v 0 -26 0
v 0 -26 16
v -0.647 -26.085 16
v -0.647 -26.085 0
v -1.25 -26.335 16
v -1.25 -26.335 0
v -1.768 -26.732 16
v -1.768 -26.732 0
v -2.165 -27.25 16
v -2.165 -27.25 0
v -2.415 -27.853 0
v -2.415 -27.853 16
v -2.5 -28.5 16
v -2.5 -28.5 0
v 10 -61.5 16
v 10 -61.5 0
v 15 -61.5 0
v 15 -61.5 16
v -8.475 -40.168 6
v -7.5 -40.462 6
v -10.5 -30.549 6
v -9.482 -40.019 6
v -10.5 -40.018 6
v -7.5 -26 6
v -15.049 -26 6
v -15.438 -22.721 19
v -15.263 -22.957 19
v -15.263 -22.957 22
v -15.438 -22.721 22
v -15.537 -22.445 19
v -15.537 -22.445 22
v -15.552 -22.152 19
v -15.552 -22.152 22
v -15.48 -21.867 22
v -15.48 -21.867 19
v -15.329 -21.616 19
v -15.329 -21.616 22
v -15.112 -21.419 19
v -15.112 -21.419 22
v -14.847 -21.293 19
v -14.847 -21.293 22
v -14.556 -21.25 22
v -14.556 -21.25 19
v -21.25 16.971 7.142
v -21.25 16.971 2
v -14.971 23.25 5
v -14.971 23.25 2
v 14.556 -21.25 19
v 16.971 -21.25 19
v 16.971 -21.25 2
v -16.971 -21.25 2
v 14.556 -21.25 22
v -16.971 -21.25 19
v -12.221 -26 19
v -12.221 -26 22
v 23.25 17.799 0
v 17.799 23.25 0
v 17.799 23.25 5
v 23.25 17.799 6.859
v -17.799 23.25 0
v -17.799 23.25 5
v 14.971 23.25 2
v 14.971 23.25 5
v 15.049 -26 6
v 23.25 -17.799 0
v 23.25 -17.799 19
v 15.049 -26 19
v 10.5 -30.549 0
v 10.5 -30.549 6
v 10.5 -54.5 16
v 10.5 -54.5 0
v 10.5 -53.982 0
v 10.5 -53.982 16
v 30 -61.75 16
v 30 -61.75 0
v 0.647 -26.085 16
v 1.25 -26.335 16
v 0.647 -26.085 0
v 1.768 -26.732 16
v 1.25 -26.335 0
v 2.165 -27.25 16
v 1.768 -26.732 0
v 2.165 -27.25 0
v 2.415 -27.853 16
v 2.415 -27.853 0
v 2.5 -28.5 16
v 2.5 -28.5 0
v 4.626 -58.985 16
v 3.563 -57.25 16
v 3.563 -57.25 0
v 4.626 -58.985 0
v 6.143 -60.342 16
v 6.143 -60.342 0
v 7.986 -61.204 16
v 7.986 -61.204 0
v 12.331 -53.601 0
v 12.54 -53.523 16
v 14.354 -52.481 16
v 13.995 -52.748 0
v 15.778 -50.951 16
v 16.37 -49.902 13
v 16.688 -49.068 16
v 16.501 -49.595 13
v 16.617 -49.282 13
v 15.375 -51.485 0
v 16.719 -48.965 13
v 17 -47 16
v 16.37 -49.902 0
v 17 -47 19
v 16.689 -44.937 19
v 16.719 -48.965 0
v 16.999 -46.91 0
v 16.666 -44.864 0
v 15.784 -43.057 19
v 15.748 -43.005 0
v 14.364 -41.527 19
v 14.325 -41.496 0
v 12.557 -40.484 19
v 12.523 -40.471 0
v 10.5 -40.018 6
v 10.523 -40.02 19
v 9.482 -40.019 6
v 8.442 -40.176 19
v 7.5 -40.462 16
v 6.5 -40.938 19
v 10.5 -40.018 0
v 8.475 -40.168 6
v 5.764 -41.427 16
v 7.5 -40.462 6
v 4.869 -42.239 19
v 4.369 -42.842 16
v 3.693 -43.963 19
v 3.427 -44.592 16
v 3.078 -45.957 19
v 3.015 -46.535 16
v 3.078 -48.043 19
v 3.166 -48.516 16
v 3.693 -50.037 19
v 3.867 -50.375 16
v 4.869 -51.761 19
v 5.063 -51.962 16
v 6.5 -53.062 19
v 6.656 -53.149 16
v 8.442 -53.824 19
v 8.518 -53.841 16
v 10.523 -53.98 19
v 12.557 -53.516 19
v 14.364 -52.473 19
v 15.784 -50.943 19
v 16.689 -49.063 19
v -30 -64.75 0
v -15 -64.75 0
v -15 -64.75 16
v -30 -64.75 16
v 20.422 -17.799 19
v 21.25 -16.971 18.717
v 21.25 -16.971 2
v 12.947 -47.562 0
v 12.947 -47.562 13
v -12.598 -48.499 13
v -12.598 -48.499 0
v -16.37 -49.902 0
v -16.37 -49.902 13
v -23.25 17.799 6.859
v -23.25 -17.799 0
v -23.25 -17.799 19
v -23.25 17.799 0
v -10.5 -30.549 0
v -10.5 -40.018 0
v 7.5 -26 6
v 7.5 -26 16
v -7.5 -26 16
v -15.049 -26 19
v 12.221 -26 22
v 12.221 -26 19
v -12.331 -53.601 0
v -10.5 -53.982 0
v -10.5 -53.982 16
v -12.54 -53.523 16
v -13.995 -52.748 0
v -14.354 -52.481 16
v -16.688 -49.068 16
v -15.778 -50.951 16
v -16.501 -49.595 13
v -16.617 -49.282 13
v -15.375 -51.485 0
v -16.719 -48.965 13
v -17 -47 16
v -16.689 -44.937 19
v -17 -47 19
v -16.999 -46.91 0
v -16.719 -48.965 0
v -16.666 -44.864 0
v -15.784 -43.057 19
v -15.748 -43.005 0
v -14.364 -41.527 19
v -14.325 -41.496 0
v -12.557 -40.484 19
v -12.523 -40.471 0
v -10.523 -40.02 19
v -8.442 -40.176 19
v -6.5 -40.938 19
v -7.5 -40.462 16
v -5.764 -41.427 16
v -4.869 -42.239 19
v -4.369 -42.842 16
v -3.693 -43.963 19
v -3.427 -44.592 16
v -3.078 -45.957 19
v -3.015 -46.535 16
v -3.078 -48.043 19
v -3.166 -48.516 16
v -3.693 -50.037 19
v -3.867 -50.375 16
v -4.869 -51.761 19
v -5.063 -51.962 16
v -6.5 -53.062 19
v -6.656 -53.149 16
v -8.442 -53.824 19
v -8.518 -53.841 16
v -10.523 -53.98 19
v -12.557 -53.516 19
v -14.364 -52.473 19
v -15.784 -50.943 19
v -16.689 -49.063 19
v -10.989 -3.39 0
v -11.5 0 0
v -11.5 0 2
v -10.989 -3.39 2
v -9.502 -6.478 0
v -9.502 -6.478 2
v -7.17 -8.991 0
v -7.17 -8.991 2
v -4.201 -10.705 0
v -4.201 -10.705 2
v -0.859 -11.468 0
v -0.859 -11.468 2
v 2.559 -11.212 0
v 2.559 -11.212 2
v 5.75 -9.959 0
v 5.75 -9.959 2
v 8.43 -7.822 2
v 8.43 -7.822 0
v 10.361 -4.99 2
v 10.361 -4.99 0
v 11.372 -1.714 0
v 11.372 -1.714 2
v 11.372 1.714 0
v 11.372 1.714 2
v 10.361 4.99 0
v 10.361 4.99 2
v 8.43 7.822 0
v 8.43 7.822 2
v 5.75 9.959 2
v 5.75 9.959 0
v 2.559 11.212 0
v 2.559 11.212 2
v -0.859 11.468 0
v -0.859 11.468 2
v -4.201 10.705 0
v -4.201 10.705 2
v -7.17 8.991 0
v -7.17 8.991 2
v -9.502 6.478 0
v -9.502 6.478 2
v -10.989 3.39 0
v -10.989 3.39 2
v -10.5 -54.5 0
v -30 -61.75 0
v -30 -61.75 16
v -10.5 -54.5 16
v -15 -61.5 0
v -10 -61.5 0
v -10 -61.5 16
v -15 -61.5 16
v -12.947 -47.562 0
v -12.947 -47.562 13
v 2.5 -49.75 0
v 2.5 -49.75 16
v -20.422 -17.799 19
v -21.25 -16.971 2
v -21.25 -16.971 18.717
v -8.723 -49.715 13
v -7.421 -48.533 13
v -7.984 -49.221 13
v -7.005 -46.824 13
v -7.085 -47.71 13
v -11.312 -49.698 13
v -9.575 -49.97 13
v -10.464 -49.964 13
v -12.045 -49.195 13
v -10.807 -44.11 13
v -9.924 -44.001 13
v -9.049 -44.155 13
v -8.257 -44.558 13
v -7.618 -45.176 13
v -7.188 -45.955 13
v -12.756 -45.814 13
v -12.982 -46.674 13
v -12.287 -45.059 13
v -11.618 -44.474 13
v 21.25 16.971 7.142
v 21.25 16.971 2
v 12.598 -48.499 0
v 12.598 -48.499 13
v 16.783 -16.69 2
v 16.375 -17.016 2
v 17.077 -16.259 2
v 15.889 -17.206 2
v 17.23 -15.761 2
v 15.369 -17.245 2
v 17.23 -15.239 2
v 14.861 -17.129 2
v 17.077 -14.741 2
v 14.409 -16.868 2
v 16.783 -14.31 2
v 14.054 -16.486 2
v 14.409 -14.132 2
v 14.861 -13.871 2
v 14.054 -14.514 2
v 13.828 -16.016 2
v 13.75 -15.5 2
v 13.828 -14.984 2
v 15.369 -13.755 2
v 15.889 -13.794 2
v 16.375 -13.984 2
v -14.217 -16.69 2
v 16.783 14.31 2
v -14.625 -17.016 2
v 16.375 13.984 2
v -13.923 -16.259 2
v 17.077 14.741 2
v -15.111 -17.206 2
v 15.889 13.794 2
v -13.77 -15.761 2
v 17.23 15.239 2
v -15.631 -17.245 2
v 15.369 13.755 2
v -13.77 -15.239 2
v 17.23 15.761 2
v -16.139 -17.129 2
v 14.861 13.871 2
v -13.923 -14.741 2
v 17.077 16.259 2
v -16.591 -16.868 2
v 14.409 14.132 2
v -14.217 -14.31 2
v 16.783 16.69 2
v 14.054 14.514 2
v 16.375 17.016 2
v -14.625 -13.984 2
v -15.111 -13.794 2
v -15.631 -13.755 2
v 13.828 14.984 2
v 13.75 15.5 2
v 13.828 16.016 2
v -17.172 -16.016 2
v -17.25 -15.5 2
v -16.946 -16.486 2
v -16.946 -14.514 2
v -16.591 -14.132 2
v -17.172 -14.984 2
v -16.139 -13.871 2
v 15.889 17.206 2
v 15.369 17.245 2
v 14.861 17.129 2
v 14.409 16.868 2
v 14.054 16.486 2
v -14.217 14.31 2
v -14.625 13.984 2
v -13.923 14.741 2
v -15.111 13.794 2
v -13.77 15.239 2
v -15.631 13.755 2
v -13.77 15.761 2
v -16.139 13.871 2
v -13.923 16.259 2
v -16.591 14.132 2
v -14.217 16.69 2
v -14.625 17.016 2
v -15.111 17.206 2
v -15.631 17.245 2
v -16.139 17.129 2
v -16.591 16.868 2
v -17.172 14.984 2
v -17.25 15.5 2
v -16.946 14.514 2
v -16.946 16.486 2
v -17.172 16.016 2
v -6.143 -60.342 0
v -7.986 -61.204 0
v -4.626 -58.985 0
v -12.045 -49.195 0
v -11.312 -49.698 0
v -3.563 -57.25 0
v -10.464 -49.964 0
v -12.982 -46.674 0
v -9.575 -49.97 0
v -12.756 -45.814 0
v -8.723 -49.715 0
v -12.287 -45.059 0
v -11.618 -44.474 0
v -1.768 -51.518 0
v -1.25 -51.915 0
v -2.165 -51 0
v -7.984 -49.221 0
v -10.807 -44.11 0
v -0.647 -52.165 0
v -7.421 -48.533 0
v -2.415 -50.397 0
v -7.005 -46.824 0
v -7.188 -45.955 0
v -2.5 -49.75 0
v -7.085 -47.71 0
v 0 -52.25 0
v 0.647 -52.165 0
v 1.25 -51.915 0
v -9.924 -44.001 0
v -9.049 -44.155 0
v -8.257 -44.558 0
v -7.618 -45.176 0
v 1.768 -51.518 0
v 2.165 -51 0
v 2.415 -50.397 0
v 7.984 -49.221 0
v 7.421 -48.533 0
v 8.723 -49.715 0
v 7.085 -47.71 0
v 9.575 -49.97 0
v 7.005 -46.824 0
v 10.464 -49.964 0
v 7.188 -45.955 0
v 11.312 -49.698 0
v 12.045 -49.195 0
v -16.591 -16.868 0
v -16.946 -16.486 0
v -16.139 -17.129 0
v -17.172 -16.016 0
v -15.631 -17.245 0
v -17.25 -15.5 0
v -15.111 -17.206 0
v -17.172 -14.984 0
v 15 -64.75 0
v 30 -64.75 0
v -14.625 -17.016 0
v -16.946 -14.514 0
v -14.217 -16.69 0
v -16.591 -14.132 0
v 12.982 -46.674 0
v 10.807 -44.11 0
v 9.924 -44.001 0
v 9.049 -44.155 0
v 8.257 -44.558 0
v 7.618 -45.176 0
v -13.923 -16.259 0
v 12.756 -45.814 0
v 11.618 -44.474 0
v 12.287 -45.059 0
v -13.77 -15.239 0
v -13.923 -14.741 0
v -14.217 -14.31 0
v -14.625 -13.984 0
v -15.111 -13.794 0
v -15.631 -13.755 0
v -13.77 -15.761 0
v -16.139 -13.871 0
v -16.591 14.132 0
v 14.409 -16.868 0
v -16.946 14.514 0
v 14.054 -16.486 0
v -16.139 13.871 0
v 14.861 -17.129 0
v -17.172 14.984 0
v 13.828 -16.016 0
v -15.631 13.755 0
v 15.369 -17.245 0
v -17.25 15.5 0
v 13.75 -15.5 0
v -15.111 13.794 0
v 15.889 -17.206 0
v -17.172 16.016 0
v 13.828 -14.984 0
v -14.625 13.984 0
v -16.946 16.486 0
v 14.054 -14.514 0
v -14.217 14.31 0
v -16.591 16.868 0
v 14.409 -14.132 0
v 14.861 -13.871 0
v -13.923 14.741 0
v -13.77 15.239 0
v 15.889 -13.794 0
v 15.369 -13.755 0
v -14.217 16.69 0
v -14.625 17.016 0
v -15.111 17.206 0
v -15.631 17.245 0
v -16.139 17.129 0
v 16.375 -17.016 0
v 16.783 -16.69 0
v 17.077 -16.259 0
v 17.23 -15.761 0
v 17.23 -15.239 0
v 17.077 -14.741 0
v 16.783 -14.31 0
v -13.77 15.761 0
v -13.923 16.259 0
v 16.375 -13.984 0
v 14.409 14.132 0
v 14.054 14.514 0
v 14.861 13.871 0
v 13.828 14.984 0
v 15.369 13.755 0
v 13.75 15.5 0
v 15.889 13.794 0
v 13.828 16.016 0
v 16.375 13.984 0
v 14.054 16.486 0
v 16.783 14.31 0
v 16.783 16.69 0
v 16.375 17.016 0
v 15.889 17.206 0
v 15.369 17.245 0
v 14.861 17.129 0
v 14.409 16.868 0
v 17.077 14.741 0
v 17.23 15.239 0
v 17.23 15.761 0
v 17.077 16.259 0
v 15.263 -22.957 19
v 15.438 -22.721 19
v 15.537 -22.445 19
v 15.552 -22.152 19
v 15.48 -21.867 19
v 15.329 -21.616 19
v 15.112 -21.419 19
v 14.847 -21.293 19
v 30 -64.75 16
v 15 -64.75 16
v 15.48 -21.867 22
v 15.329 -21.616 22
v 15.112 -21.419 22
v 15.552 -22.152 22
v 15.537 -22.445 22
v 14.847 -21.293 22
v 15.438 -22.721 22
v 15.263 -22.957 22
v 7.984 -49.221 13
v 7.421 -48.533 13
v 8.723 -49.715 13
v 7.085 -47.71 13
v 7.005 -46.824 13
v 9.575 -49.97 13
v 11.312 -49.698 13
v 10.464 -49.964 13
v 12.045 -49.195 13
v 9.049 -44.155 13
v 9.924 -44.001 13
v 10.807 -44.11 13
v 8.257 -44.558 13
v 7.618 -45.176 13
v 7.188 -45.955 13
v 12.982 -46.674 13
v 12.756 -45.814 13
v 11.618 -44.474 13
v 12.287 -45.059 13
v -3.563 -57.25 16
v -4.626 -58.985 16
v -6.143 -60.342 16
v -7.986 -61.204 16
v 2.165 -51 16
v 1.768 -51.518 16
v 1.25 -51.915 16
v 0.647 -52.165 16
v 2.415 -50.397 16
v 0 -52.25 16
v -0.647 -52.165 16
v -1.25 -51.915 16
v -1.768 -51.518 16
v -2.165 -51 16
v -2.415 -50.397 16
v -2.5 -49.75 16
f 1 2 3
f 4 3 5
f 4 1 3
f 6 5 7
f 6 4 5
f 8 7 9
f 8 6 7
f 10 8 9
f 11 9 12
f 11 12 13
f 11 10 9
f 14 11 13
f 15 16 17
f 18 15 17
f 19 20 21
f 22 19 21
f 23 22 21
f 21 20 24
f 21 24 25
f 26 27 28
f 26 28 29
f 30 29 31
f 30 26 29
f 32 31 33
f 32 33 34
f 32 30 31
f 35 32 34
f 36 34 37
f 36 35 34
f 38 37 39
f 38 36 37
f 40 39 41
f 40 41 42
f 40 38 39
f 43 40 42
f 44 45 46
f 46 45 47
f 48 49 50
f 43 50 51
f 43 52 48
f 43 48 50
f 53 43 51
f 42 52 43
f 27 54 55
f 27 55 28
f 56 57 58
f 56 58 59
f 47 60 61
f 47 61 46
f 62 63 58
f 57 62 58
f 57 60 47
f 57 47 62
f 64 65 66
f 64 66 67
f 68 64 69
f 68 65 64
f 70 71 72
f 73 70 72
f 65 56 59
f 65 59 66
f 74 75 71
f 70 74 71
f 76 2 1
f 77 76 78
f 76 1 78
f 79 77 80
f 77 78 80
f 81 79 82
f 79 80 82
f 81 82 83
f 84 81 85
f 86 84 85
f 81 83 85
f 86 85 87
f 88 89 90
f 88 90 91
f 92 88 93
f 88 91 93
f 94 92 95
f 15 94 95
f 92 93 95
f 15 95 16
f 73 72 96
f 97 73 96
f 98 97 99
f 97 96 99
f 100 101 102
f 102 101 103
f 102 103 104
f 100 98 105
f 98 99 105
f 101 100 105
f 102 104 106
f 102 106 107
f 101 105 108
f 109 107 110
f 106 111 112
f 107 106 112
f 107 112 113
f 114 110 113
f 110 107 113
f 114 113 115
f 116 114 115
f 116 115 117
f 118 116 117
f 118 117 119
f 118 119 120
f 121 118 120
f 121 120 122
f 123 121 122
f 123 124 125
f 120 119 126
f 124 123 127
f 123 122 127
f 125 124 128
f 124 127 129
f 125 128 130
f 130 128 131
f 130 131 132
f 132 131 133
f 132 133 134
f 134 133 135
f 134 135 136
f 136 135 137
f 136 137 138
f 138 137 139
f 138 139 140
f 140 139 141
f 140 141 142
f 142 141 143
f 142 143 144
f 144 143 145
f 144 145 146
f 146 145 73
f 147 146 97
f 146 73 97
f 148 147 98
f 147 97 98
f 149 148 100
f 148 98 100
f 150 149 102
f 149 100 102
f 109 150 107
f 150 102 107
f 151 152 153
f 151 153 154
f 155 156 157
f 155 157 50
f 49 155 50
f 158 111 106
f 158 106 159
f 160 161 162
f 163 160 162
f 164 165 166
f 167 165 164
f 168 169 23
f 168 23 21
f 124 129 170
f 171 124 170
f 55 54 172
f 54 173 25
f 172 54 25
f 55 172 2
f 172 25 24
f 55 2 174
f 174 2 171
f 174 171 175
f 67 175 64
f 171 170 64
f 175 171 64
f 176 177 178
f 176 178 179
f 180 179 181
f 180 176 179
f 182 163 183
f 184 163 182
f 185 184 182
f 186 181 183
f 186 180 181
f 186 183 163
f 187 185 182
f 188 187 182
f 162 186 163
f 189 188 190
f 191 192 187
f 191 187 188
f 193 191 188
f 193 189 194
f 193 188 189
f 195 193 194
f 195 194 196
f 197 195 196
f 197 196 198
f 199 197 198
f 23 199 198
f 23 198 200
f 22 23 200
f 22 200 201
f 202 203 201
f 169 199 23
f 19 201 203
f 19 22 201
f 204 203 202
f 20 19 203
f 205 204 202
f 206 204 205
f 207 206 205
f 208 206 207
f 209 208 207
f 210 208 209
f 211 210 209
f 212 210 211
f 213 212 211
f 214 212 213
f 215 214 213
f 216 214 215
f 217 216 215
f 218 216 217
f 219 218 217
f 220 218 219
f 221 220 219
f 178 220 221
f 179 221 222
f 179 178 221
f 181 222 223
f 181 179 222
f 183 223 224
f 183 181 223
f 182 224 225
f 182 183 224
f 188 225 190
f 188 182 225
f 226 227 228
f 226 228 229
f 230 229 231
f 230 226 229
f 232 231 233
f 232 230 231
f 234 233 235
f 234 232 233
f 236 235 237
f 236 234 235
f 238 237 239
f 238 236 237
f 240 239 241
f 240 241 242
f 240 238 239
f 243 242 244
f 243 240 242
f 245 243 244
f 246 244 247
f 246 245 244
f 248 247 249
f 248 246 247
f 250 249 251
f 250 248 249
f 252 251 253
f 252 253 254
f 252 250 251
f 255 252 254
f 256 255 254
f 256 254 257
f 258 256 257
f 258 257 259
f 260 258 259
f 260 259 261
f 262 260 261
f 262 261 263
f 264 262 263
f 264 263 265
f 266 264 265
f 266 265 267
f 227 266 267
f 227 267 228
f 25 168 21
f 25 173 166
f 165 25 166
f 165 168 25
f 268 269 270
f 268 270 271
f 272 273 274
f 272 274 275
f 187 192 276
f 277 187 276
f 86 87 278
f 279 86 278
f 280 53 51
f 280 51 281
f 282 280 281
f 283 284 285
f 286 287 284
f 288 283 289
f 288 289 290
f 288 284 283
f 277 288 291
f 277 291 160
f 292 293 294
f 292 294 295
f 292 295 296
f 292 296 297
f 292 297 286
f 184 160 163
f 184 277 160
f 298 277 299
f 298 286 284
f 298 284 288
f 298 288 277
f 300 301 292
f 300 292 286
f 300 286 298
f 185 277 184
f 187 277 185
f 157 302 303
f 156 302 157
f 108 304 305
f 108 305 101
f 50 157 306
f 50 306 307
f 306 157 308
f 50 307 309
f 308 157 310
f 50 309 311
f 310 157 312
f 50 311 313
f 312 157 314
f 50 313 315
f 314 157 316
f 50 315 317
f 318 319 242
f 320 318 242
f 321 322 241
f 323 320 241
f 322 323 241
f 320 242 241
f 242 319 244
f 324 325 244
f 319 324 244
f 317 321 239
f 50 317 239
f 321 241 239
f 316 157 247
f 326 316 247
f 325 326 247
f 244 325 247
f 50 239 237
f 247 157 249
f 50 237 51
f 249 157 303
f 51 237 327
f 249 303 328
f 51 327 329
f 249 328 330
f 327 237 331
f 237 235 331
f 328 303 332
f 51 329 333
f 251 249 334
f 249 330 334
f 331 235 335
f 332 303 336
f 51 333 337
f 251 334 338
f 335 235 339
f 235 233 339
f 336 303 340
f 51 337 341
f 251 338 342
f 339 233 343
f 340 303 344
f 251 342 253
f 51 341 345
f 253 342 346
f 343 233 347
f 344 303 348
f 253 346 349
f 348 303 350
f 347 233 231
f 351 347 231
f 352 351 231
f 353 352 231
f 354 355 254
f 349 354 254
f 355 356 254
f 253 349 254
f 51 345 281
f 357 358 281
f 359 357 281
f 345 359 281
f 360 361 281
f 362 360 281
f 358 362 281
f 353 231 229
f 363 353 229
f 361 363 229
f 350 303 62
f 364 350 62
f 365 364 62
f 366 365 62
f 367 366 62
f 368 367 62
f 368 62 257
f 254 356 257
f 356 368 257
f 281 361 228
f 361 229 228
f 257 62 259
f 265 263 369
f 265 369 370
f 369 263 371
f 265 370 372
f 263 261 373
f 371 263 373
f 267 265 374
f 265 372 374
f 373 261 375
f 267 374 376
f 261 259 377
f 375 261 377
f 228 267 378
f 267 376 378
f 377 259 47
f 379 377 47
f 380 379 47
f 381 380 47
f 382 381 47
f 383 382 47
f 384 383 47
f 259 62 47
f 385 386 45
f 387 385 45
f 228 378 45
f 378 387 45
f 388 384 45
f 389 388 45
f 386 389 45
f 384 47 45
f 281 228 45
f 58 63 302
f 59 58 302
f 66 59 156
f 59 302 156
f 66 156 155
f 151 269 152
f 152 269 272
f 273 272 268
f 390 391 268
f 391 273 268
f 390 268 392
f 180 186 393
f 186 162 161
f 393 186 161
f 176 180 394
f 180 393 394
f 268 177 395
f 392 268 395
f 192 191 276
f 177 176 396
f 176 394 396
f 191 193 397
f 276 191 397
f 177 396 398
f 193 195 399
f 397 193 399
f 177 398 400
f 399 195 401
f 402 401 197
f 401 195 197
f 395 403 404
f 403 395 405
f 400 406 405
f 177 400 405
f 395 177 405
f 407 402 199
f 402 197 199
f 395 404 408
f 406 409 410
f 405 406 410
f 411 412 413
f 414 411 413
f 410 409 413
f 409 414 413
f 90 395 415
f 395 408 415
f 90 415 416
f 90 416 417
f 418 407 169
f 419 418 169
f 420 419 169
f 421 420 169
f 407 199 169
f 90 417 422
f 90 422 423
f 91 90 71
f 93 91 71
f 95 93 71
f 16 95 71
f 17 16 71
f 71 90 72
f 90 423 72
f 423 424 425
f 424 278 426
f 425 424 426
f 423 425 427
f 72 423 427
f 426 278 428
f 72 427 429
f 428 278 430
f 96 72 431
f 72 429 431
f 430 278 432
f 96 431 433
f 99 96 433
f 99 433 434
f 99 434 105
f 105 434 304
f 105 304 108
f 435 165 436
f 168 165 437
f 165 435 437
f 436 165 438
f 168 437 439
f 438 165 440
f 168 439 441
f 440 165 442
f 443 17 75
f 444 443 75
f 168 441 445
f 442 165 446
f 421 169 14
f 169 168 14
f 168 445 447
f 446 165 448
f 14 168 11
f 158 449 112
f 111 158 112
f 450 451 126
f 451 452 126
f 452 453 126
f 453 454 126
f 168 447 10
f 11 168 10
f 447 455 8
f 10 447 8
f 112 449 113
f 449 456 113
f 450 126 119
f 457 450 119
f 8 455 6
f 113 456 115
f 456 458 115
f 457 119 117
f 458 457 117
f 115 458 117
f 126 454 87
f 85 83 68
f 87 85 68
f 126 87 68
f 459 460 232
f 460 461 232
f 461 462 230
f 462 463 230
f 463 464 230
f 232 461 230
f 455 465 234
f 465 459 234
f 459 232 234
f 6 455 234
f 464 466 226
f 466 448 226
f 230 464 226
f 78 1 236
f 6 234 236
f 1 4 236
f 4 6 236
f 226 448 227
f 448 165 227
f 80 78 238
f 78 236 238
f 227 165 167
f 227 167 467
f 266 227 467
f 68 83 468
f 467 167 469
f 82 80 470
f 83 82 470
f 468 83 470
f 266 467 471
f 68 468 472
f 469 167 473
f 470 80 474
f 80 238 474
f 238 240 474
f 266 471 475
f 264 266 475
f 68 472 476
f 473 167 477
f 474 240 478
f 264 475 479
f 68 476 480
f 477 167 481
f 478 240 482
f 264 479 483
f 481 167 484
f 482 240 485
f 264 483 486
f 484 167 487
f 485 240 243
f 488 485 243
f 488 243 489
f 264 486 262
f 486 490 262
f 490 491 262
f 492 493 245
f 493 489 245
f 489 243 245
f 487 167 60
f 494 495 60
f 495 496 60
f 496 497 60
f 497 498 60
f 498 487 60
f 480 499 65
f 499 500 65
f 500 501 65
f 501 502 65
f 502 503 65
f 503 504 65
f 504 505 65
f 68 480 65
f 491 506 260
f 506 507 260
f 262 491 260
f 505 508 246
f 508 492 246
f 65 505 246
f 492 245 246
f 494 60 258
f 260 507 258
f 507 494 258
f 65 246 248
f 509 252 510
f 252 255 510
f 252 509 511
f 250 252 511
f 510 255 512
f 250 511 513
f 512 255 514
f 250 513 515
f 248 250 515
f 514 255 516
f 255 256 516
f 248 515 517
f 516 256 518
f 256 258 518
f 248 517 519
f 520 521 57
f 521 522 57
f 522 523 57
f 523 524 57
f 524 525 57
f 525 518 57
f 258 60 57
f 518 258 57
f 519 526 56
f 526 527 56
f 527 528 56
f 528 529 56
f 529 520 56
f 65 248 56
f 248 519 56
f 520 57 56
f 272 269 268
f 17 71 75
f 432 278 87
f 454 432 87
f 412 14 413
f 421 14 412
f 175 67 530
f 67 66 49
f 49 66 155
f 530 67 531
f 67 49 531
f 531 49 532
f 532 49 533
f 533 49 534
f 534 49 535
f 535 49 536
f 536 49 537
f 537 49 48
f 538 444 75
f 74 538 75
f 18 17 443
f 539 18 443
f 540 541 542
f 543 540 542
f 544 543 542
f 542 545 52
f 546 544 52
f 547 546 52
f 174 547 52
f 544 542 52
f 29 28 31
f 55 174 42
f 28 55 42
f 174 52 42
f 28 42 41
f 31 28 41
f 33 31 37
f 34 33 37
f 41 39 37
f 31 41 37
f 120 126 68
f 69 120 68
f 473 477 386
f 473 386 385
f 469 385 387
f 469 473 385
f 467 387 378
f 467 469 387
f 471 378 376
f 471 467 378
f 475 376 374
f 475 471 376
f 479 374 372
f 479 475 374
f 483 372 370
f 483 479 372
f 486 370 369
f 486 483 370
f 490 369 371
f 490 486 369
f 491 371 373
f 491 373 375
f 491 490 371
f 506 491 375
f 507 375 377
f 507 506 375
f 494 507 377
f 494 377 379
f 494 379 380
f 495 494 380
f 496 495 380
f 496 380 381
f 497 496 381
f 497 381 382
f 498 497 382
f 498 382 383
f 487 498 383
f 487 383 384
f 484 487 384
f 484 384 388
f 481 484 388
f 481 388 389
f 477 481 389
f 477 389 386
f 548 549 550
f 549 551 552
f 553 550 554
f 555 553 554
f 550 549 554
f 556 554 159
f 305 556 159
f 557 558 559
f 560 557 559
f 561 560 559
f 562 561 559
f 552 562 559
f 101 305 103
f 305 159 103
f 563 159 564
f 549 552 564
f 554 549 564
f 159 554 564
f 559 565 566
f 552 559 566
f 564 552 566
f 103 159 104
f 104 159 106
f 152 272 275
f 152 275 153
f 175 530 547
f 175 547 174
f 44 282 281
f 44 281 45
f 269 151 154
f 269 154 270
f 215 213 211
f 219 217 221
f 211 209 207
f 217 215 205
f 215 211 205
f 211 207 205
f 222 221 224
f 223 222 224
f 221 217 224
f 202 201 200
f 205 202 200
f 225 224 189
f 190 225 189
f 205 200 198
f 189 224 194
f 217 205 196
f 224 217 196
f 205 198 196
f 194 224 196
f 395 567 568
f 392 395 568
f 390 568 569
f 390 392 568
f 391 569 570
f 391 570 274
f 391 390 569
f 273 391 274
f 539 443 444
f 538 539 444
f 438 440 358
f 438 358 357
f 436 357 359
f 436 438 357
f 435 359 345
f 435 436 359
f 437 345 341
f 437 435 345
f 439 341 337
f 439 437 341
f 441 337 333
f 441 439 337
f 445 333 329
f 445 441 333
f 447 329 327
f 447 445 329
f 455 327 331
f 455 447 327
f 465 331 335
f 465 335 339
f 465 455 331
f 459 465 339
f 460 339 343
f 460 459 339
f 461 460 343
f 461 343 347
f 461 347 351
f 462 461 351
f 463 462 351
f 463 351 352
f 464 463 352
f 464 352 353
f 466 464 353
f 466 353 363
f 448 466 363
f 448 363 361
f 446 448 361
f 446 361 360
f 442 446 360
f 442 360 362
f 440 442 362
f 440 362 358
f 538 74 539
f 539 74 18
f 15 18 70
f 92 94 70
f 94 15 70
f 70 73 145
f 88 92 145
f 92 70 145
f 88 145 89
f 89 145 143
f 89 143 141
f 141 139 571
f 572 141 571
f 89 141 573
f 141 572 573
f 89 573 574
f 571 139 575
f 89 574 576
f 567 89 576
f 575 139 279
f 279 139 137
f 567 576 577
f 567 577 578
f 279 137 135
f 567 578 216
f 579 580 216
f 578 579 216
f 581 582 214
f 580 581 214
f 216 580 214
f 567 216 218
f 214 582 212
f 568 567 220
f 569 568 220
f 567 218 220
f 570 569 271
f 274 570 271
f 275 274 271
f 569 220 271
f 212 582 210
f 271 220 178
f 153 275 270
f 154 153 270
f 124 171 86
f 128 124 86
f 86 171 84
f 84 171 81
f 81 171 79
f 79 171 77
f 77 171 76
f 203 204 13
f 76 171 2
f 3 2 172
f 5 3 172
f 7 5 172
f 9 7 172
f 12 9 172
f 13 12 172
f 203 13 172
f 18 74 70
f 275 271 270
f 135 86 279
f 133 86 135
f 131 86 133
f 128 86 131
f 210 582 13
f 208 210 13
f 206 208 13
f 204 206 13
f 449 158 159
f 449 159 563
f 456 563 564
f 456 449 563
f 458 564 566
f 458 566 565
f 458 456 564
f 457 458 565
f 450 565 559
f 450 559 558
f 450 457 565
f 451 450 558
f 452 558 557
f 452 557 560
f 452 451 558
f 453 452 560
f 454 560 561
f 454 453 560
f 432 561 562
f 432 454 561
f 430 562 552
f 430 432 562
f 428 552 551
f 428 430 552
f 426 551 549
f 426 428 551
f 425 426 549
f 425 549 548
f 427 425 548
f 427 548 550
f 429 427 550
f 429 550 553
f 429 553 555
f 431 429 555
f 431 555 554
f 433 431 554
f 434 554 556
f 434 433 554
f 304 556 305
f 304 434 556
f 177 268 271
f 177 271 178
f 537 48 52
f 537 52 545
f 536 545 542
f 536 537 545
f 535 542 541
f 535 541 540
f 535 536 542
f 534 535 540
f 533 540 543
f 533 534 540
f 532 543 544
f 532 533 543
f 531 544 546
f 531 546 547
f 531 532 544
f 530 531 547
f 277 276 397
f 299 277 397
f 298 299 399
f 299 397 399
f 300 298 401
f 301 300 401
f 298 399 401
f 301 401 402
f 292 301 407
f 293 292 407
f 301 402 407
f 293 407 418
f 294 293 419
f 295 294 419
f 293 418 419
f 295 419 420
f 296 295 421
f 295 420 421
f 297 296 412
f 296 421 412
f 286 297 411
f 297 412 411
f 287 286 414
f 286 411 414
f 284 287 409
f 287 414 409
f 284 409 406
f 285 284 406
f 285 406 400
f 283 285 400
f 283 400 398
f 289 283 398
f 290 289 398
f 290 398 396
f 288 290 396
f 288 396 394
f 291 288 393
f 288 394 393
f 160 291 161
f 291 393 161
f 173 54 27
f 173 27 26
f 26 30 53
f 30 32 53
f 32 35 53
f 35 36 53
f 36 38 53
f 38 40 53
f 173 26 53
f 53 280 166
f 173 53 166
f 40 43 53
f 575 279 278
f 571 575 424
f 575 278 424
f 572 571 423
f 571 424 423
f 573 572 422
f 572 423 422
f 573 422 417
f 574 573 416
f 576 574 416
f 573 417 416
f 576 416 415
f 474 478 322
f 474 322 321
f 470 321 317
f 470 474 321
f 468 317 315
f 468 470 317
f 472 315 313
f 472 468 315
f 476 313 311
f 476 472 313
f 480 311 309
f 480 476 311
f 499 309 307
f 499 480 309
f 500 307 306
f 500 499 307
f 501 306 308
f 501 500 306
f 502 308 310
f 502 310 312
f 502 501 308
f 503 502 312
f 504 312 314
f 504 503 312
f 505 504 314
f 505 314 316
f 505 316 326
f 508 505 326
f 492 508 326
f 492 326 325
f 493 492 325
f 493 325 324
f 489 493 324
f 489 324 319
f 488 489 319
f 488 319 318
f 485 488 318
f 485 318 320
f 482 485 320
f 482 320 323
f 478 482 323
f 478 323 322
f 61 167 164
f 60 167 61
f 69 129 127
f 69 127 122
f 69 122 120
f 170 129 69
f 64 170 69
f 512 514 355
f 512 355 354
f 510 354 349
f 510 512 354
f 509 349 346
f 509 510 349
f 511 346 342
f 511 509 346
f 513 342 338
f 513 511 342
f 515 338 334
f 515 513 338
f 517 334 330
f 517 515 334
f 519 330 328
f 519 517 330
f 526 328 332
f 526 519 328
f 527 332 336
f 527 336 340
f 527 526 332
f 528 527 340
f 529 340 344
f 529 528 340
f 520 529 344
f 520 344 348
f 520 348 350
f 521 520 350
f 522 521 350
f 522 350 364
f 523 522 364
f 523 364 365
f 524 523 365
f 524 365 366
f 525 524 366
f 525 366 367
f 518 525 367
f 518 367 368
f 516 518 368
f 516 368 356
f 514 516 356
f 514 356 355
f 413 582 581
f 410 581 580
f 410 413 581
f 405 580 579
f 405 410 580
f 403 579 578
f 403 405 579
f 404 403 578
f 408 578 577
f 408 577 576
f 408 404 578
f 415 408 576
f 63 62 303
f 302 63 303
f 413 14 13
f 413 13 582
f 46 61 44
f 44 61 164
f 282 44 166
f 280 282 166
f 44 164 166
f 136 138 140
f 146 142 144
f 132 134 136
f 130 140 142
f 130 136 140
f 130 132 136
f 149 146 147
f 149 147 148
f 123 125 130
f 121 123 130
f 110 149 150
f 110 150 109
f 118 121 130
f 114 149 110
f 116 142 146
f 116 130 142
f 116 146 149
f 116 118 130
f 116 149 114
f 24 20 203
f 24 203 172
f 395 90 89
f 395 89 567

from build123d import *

# Parameters (mm, degrees)
SKETCH3_R               = 11.5
SKETCH3_R_2             = 1.75
BOSS_EXTRUDE1_DEPTH     = 19
CUT_EXTRUDE1_START      = 19
SKETCH3_3_R             = 11.5
SKETCH3_3_R_2           = 1.75
CUT_EXTRUDE1_DEPTH      = 17
SKETCH3_4_R             = 1.75
SKETCH3_4_R_2           = 11.5
CUT_EXTRUDE3_DEPTH      = 38.975320933
CUT_EXTRUDE7_DEPTH      = 38.975320933
CUT_EXTRUDE7_DEPTH_BACK = 38.975320933
CUT_EXTRUDE8_DEPTH      = 38.015199581
BOSS_EXTRUDE4_DEPTH     = 19
BOSS_EXTRUDE5_START     = 19
BOSS_EXTRUDE5_DEPTH     = 3
BOSS_EXTRUDE6_DEPTH     = 6
BOSS_EXTRUDE7_START     = -6
BOSS_EXTRUDE7_DEPTH     = 16
SKETCH14_R              = 7
BOSS_EXTRUDE8_DEPTH     = 3
CUT_EXTRUDE10_DEPTH     = 13


# Read off the part's stored shape, not the designer's step: Boss-Extrude7, Cut-Extrude10
with BuildPart() as part:
    # Sketch3 → Boss-Extrude1 (new body)
    # profile 1 of 7: a face of its own
    with BuildSketch(Plane.XY):
        Polygon((-23.25, 17.798989873), (-17.798989873, 23.25), (17.798989873, 23.25), (23.25, 17.798989873), (23.25, -17.798989873), (17.798989873, -23.25), (-17.798989873, -23.25), (-23.25, -17.798989873), align=None)
        Polygon((21.25, 16.970562748), (16.970562748, 21.25), (-16.970562748, 21.25), (-21.25, 16.970562748), (-21.25, -16.970562748), (-16.970562748, -21.25), (16.970562748, -21.25), (21.25, -16.970562748), align=None, mode=Mode.SUBTRACT)
    # profile 2 of 7: a face of its own
    with BuildSketch(Plane.XY):
        Polygon((21.25, 16.970562748), (21.25, -16.970562748), (16.970562748, -21.25), (-16.970562748, -21.25), (-21.25, -16.970562748), (-21.25, 16.970562748), (-16.970562748, 21.25), (16.970562748, 21.25), align=None)
        Circle(SKETCH3_R, mode=Mode.SUBTRACT)
        with Locations((-15.5, -15.5)):
            Circle(SKETCH3_R_2, mode=Mode.SUBTRACT)
        with Locations((15.5, -15.5)):
            Circle(SKETCH3_R_2, mode=Mode.SUBTRACT)
        with Locations((15.5, 15.5)):
            Circle(SKETCH3_R_2, mode=Mode.SUBTRACT)
        with Locations((-15.5, 15.5)):
            Circle(SKETCH3_R_2, mode=Mode.SUBTRACT)
    # profile 3 of 7: a face of its own
    with BuildSketch(Plane.XY):
        with Locations((-15.5, 15.5)):
            Circle(SKETCH3_R_2)
    # profile 4 of 7: a face of its own
    with BuildSketch(Plane.XY):
        with Locations((15.5, 15.5)):
            Circle(SKETCH3_R_2)
    # profile 5 of 7: a face of its own
    with BuildSketch(Plane.XY):
        with Locations((15.5, -15.5)):
            Circle(SKETCH3_R_2)
    # profile 6 of 7: a face of its own
    with BuildSketch(Plane.XY):
        with Locations((-15.5, -15.5)):
            Circle(SKETCH3_R_2)
    # profile 7 of 7: a face of its own
    with BuildSketch(Plane.XY):
        Circle(SKETCH3_R)
    extrude(amount=BOSS_EXTRUDE1_DEPTH)

    # Sketch3<3> → Cut-Extrude1 (cut)
    with BuildSketch(Plane.XY.offset(CUT_EXTRUDE1_START)):
        Polygon((21.25, 16.970562748), (21.25, -16.970562748), (16.970562748, -21.25), (-16.970562748, -21.25), (-21.25, -16.970562748), (-21.25, 16.970562748), (-16.970562748, 21.25), (16.970562748, 21.25), align=None)
        Circle(SKETCH3_3_R, mode=Mode.SUBTRACT)
        with Locations((-15.5, -15.5)):
            Circle(SKETCH3_3_R_2, mode=Mode.SUBTRACT)
        with Locations((15.5, -15.5)):
            Circle(SKETCH3_3_R_2, mode=Mode.SUBTRACT)
        with Locations((15.5, 15.5)):
            Circle(SKETCH3_3_R_2, mode=Mode.SUBTRACT)
        with Locations((-15.5, 15.5)):
            Circle(SKETCH3_3_R_2, mode=Mode.SUBTRACT)
    extrude(amount=-CUT_EXTRUDE1_DEPTH, mode=Mode.SUBTRACT)

    # Sketch3<4> → Cut-Extrude3 (cut, through all)
    with BuildSketch(Plane.XY):
        with Locations(Location((-15.5, 15.5, 0), (0, 0, 180))):
            Circle(SKETCH3_4_R)
        with Locations(Location((15.5, 15.5, 0), (0, 0, 180))):
            Circle(SKETCH3_4_R)
        with Locations(Location((-15.5, -15.5, 0), (0, 0, 180))):
            Circle(SKETCH3_4_R)
        with Locations(Location((0, 0, 0), (0, 0, 180))):
            Circle(SKETCH3_4_R_2)
        with Locations(Location((15.5, -15.5, 0), (0, 0, 180))):
            Circle(SKETCH3_4_R)
    extrude(amount=CUT_EXTRUDE3_DEPTH, mode=Mode.SUBTRACT)

    # Sketch6 → Cut-Extrude7 (cut, two sides: drawn at the far end of the back side and taken through both)
    with BuildSketch(Plane(origin=(0, 0, 0), x_dir=(0, 0, -1), z_dir=(1, 0, 0)).offset(-CUT_EXTRUDE7_DEPTH_BACK)):
        Polygon((-19, 23.25), (-5, 23.25), (-19, -17.798989873), align=None)
    extrude(amount=CUT_EXTRUDE7_DEPTH + CUT_EXTRUDE7_DEPTH_BACK, mode=Mode.SUBTRACT)

    # Sketch8 → Cut-Extrude8 (cut, through all)
    with BuildSketch(Plane.XY.offset(2)):
        Polygon((-16.970562748, 21.25), (-14.970562748, 23.25), (14.970562748, 23.25), (16.970562748, 21.25), align=None)
    extrude(amount=CUT_EXTRUDE8_DEPTH, mode=Mode.SUBTRACT)

    # Sketch10 → Boss-Extrude4 (add)
    with BuildSketch(Plane.XY):
        Polygon((19.798989873, -21.25), (-19.798989873, -21.25), (-15.048989873, -26), (15.048989873, -26), align=None)
    extrude(amount=BOSS_EXTRUDE4_DEPTH)

    # Sketch11 → Boss-Extrude5 (add)
    with BuildSketch(Plane.XY.offset(BOSS_EXTRUDE5_START)):
        with BuildLine():
            Line((-14.556349186, -21.25), (14.556349186, -21.25))
            ThreePointArc((14.556349186, -21.25), (15.480228719, -21.867316568), (15.263455967, -22.957106781))
            Line((15.263455967, -22.957106781), (12.220562748, -26))
            Line((12.220562748, -26), (-12.220562748, -26))
            Line((-12.220562748, -26), (-15.263455967, -22.957106781))
            ThreePointArc((-15.263455967, -22.957106781), (-15.480228719, -21.867316568), (-14.556349186, -21.25))
        make_face()
    extrude(amount=BOSS_EXTRUDE5_DEPTH)


with BuildPart() as body_2:
    # Sketch12 → Boss-Extrude6 (new body)
    with BuildSketch(Plane.XY):
        with BuildLine():
            Line((2.5, -28.5), (2.5, -49.75))
            ThreePointArc((2.5, -49.75), (1.767766953, -51.517766953), (0, -52.25))
            Line((0, -52.25), (0, -57.25))
            Line((0, -57.25), (10.5, -57.25))
            Line((10.5, -57.25), (10.5, -30.548989873))
            Line((10.5, -30.548989873), (15.048989873, -26))
            Line((15.048989873, -26), (0, -26))
            ThreePointArc((0, -26), (1.767766953, -26.732233047), (2.5, -28.5))
        make_face()
    extrude(amount=BOSS_EXTRUDE6_DEPTH)

    # Boss-Extrude7 outline → Boss-Extrude7 (add)
    with BuildSketch(Plane.XY.offset(6).offset(BOSS_EXTRUDE7_START)):
        with BuildLine():
            Line((30, -61.75), (10.5, -54.5))
            Line((10.5, -54.5), (10.5, -53.982120022))
            ThreePointArc((10.5, -53.982120022), (16.833795921, -45.483677703), (7.5, -40.461651585))
            Line((7.5, -40.461651585), (7.5, -26))
            Line((7.5, -26), (0, -26))
            ThreePointArc((0, -26), (1.767766953, -26.732233047), (2.5, -28.5))
            Line((2.5, -28.5), (2.5, -49.75))
            ThreePointArc((2.5, -49.75), (1.767766953, -51.517766953), (0, -52.25))
            Line((0, -52.25), (0, -57.25))
            Line((0, -57.25), (3.562803405, -57.25))
            ThreePointArc((3.562803405, -57.25), (6.143187845, -60.341660723), (10, -61.5))
            Line((10, -61.5), (15, -61.5))
            Line((15, -61.5), (15, -64.75))
            Line((15, -64.75), (30, -64.75))
            Line((30, -64.75), (30, -61.75))
        make_face()
    extrude(amount=BOSS_EXTRUDE7_DEPTH)

    # Sketch14 → Boss-Extrude8 (add)
    with BuildSketch(Plane.XY.offset(16)):
        with Locations((10, -47)):
            Circle(SKETCH14_R)
    extrude(amount=BOSS_EXTRUDE8_DEPTH)

    # Cut-Extrude10 outline → Cut-Extrude10 (cut)
    with BuildSketch(Plane.XY):
        with BuildLine():
            ThreePointArc((12.946853826, -47.562185494), (7.188060526, -45.95453532), (12.5983656, -48.499498652))
            Line((12.5983656, -48.499498652), (16.370188856, -49.901843196))
            ThreePointArc((16.370188856, -49.901843196), (16.561192108, -49.439417579), (16.718677082, -48.964530038))
            Line((16.718677082, -48.964530038), (12.946853826, -47.562185494))
        make_face()
    extrude(amount=CUT_EXTRUDE10_DEPTH, mode=Mode.SUBTRACT)


with BuildPart() as body_3:
    # Mirror1: mirrored copy
    add(body_2.part.mirror(Plane(origin=(0, 0, 0), x_dir=(0, 0, 1), z_dir=(1, 0, 0))))


with BuildPart() as body_2_1:
    add(body_2.part)

    # Combine1: union body 3, part
    add(body_3.part)
    add(part.part)


solid = body_2_1.part
